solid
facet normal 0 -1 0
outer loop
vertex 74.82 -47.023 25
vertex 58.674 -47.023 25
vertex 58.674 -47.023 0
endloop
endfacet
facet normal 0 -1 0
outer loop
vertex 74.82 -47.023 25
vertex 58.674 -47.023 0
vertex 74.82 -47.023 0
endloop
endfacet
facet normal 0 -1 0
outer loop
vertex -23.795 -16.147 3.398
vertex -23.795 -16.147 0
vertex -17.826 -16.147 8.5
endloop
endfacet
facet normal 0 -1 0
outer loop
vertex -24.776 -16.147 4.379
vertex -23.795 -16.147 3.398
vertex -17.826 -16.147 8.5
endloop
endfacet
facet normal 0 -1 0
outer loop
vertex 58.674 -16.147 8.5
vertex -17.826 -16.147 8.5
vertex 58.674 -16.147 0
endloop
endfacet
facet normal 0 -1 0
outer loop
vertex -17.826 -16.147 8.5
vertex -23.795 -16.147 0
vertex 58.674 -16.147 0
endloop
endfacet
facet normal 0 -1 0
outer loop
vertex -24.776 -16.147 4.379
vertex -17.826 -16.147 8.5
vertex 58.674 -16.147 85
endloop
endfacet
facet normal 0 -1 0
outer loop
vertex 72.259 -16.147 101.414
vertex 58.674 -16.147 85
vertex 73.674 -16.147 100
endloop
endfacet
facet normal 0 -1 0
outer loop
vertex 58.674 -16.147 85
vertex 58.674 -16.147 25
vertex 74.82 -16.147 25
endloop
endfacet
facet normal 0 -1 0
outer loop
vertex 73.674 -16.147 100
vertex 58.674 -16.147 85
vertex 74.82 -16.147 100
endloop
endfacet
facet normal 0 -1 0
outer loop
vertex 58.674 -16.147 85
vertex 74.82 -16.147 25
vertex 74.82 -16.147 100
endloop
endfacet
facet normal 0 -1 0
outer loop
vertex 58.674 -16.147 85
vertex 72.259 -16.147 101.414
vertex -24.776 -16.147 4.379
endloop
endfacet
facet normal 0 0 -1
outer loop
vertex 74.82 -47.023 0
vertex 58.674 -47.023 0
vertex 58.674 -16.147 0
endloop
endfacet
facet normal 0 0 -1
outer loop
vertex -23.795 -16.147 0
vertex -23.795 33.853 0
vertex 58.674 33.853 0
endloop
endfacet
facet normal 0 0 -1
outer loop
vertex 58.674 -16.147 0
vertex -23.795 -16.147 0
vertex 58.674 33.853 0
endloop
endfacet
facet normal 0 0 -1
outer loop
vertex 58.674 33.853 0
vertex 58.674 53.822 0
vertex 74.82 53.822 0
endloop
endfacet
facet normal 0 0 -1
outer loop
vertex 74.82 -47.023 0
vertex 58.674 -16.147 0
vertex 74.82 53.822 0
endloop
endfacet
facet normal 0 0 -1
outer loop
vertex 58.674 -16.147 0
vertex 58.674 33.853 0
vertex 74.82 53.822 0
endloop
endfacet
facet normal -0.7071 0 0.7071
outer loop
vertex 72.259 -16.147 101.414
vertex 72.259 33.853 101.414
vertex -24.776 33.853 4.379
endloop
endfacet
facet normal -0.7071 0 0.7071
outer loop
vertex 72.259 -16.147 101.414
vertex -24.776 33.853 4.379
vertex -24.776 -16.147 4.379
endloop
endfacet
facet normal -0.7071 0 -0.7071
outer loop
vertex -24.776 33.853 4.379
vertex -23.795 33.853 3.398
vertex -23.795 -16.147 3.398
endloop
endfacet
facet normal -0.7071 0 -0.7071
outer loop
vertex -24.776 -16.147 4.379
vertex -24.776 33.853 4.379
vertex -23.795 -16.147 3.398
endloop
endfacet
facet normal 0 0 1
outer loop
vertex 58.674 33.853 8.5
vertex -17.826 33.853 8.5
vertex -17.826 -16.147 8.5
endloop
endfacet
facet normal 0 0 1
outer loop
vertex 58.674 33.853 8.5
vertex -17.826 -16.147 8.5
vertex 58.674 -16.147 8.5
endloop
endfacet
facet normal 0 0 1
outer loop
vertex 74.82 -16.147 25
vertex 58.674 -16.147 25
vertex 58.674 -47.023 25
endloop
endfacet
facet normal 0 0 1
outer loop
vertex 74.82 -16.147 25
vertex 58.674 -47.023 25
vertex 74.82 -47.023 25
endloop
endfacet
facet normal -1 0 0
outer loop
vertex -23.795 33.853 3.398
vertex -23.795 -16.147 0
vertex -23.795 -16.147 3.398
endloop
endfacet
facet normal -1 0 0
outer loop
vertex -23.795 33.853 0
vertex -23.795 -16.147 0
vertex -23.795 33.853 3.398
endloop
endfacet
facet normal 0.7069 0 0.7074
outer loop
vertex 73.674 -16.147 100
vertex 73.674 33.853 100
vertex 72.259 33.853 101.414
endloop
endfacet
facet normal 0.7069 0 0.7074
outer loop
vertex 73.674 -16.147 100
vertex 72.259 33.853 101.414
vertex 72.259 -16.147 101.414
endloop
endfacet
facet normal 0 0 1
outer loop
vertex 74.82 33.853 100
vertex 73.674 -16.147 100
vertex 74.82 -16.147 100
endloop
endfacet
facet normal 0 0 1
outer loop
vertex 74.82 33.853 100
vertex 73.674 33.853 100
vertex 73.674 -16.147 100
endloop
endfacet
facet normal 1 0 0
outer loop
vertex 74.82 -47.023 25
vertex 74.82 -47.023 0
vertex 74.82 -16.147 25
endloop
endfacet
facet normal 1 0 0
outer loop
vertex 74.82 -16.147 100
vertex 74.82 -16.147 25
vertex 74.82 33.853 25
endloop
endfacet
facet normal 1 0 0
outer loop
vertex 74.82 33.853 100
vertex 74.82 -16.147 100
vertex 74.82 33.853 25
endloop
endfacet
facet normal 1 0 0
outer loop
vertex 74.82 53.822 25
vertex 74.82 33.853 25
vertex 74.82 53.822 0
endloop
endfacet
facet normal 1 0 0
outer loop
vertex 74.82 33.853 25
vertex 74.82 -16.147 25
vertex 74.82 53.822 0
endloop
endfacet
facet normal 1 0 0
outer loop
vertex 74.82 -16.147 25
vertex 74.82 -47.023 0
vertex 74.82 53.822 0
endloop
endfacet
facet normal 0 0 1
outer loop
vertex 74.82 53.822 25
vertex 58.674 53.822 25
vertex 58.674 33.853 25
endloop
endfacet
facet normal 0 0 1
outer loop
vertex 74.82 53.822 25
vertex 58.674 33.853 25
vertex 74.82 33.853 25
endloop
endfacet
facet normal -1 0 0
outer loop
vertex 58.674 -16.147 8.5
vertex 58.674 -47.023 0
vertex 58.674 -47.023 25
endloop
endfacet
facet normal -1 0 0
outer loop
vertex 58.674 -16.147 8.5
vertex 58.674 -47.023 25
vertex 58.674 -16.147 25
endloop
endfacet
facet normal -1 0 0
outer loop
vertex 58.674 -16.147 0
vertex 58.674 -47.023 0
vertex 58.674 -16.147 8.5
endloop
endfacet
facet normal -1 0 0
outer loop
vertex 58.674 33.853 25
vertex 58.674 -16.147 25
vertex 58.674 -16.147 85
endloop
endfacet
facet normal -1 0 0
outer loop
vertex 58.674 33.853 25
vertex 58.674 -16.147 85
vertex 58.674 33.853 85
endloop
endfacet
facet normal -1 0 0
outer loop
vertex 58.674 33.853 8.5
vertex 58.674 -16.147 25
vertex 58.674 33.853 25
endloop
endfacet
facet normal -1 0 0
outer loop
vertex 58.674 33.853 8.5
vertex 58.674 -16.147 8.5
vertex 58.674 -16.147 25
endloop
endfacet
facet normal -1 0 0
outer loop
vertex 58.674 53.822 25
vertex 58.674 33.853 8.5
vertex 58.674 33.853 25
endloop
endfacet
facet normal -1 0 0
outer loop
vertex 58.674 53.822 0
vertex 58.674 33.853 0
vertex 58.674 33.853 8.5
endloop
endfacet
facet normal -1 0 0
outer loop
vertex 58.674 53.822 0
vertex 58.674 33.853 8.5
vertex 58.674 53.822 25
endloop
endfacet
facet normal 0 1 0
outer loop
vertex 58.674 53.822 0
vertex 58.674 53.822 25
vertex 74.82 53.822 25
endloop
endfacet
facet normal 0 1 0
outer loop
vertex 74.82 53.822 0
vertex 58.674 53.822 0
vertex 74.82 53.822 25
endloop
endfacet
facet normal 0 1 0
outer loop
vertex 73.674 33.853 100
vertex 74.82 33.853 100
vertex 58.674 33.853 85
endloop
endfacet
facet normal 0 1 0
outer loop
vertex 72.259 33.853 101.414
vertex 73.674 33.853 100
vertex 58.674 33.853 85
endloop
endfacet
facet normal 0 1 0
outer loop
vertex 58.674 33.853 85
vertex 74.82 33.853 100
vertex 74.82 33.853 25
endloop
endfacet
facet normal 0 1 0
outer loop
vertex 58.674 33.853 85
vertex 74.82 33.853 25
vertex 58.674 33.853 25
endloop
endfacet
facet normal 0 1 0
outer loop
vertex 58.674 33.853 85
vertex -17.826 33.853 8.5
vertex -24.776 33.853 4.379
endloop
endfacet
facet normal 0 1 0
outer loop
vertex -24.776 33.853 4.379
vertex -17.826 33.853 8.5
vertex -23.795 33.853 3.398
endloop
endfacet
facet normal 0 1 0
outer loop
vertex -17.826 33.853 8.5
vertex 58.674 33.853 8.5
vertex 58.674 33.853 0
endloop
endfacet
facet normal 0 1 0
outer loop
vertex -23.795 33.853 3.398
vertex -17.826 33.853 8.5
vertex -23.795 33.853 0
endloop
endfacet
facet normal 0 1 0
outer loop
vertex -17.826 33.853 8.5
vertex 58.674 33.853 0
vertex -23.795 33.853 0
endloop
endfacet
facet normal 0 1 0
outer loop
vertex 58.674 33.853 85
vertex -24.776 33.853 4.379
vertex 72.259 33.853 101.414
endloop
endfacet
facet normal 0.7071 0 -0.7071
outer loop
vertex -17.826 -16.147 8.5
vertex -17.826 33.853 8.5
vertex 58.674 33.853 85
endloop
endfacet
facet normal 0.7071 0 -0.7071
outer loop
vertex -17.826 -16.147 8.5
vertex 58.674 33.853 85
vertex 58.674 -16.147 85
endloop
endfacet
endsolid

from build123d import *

# Parameters (mm, degrees)
F0_W     = 16.1465890706
F0_H     = 50
F1_DEPTH = 100
F0_W_2   = 82.4685227126
F2_DEPTH = 8.5
F3_SIZE  = 15
F4_W     = 50
F4_H     = 137.2287848778
F5_DEPTH = 28
F4_H_2   = 21.2132034356
F4_H_3   = 116.0155814422
F6_DEPTH = 2
F0_H_2   = 30.8768022805
F0_H_3   = 19.9685309082
F7_DEPTH = 25


with BuildPart() as f1:
    # F0 (on Top) → F1 (new body)
    with BuildSketch(Plane.XY):
        with Locations((66.7468514293, 8.8534165174)):
            Rectangle(F0_W, F0_H)
    extrude(amount=F1_DEPTH)

    # F0 (on Top) → F2 (join)
    with BuildSketch(Plane.XY):
        with Locations((17.4392955378, 8.8534165174)):
            Rectangle(F0_W_2, F0_H)
    extrude(amount=F2_DEPTH)

    # F3
    f3_edges = [f1.edges().sort_by_distance(p)[0] for p in [
        (58.673557, 8.853417, 100),
    ]]
    chamfer(f3_edges, length=F3_SIZE)

    # F4 (on face) → F5 (cut)
    with BuildSketch(Plane(origin=(-13.163221553, 0, 13.163221553), x_dir=(0, -1, 0), z_dir=(-0.7071067812, 0, 0.7071067812))):
        with Locations((-8.8534165174, 54.1913573537)):
            Rectangle(F4_W, F4_H)
    extrude(amount=F5_DEPTH, mode=Mode.SUBTRACT)

    # F4 (on face) → F6 (join)
    with BuildSketch(Plane(origin=(-13.163221553, 0, 13.163221553), x_dir=(0, -1, 0), z_dir=(-0.7071067812, 0, 0.7071067812))):
        with Locations((-8.8534165174, 112.1991480748)):
            Rectangle(F4_W, F4_H_2)
        with Locations((-8.8534165174, 43.5847556359)):
            Rectangle(F4_W, F4_H_3)
    extrude(amount=F6_DEPTH)

    # F0 (on Top) → F7 (join)
    with BuildSketch(Plane.XY):
        with Locations((66.7468514293, -31.5849846229)):
            Rectangle(F0_W, F0_H_2)
        with Locations((66.7468514293, 43.8376819715)):
            Rectangle(F0_W, F0_H_3)
    extrude(amount=F7_DEPTH)


solid = f1.part
